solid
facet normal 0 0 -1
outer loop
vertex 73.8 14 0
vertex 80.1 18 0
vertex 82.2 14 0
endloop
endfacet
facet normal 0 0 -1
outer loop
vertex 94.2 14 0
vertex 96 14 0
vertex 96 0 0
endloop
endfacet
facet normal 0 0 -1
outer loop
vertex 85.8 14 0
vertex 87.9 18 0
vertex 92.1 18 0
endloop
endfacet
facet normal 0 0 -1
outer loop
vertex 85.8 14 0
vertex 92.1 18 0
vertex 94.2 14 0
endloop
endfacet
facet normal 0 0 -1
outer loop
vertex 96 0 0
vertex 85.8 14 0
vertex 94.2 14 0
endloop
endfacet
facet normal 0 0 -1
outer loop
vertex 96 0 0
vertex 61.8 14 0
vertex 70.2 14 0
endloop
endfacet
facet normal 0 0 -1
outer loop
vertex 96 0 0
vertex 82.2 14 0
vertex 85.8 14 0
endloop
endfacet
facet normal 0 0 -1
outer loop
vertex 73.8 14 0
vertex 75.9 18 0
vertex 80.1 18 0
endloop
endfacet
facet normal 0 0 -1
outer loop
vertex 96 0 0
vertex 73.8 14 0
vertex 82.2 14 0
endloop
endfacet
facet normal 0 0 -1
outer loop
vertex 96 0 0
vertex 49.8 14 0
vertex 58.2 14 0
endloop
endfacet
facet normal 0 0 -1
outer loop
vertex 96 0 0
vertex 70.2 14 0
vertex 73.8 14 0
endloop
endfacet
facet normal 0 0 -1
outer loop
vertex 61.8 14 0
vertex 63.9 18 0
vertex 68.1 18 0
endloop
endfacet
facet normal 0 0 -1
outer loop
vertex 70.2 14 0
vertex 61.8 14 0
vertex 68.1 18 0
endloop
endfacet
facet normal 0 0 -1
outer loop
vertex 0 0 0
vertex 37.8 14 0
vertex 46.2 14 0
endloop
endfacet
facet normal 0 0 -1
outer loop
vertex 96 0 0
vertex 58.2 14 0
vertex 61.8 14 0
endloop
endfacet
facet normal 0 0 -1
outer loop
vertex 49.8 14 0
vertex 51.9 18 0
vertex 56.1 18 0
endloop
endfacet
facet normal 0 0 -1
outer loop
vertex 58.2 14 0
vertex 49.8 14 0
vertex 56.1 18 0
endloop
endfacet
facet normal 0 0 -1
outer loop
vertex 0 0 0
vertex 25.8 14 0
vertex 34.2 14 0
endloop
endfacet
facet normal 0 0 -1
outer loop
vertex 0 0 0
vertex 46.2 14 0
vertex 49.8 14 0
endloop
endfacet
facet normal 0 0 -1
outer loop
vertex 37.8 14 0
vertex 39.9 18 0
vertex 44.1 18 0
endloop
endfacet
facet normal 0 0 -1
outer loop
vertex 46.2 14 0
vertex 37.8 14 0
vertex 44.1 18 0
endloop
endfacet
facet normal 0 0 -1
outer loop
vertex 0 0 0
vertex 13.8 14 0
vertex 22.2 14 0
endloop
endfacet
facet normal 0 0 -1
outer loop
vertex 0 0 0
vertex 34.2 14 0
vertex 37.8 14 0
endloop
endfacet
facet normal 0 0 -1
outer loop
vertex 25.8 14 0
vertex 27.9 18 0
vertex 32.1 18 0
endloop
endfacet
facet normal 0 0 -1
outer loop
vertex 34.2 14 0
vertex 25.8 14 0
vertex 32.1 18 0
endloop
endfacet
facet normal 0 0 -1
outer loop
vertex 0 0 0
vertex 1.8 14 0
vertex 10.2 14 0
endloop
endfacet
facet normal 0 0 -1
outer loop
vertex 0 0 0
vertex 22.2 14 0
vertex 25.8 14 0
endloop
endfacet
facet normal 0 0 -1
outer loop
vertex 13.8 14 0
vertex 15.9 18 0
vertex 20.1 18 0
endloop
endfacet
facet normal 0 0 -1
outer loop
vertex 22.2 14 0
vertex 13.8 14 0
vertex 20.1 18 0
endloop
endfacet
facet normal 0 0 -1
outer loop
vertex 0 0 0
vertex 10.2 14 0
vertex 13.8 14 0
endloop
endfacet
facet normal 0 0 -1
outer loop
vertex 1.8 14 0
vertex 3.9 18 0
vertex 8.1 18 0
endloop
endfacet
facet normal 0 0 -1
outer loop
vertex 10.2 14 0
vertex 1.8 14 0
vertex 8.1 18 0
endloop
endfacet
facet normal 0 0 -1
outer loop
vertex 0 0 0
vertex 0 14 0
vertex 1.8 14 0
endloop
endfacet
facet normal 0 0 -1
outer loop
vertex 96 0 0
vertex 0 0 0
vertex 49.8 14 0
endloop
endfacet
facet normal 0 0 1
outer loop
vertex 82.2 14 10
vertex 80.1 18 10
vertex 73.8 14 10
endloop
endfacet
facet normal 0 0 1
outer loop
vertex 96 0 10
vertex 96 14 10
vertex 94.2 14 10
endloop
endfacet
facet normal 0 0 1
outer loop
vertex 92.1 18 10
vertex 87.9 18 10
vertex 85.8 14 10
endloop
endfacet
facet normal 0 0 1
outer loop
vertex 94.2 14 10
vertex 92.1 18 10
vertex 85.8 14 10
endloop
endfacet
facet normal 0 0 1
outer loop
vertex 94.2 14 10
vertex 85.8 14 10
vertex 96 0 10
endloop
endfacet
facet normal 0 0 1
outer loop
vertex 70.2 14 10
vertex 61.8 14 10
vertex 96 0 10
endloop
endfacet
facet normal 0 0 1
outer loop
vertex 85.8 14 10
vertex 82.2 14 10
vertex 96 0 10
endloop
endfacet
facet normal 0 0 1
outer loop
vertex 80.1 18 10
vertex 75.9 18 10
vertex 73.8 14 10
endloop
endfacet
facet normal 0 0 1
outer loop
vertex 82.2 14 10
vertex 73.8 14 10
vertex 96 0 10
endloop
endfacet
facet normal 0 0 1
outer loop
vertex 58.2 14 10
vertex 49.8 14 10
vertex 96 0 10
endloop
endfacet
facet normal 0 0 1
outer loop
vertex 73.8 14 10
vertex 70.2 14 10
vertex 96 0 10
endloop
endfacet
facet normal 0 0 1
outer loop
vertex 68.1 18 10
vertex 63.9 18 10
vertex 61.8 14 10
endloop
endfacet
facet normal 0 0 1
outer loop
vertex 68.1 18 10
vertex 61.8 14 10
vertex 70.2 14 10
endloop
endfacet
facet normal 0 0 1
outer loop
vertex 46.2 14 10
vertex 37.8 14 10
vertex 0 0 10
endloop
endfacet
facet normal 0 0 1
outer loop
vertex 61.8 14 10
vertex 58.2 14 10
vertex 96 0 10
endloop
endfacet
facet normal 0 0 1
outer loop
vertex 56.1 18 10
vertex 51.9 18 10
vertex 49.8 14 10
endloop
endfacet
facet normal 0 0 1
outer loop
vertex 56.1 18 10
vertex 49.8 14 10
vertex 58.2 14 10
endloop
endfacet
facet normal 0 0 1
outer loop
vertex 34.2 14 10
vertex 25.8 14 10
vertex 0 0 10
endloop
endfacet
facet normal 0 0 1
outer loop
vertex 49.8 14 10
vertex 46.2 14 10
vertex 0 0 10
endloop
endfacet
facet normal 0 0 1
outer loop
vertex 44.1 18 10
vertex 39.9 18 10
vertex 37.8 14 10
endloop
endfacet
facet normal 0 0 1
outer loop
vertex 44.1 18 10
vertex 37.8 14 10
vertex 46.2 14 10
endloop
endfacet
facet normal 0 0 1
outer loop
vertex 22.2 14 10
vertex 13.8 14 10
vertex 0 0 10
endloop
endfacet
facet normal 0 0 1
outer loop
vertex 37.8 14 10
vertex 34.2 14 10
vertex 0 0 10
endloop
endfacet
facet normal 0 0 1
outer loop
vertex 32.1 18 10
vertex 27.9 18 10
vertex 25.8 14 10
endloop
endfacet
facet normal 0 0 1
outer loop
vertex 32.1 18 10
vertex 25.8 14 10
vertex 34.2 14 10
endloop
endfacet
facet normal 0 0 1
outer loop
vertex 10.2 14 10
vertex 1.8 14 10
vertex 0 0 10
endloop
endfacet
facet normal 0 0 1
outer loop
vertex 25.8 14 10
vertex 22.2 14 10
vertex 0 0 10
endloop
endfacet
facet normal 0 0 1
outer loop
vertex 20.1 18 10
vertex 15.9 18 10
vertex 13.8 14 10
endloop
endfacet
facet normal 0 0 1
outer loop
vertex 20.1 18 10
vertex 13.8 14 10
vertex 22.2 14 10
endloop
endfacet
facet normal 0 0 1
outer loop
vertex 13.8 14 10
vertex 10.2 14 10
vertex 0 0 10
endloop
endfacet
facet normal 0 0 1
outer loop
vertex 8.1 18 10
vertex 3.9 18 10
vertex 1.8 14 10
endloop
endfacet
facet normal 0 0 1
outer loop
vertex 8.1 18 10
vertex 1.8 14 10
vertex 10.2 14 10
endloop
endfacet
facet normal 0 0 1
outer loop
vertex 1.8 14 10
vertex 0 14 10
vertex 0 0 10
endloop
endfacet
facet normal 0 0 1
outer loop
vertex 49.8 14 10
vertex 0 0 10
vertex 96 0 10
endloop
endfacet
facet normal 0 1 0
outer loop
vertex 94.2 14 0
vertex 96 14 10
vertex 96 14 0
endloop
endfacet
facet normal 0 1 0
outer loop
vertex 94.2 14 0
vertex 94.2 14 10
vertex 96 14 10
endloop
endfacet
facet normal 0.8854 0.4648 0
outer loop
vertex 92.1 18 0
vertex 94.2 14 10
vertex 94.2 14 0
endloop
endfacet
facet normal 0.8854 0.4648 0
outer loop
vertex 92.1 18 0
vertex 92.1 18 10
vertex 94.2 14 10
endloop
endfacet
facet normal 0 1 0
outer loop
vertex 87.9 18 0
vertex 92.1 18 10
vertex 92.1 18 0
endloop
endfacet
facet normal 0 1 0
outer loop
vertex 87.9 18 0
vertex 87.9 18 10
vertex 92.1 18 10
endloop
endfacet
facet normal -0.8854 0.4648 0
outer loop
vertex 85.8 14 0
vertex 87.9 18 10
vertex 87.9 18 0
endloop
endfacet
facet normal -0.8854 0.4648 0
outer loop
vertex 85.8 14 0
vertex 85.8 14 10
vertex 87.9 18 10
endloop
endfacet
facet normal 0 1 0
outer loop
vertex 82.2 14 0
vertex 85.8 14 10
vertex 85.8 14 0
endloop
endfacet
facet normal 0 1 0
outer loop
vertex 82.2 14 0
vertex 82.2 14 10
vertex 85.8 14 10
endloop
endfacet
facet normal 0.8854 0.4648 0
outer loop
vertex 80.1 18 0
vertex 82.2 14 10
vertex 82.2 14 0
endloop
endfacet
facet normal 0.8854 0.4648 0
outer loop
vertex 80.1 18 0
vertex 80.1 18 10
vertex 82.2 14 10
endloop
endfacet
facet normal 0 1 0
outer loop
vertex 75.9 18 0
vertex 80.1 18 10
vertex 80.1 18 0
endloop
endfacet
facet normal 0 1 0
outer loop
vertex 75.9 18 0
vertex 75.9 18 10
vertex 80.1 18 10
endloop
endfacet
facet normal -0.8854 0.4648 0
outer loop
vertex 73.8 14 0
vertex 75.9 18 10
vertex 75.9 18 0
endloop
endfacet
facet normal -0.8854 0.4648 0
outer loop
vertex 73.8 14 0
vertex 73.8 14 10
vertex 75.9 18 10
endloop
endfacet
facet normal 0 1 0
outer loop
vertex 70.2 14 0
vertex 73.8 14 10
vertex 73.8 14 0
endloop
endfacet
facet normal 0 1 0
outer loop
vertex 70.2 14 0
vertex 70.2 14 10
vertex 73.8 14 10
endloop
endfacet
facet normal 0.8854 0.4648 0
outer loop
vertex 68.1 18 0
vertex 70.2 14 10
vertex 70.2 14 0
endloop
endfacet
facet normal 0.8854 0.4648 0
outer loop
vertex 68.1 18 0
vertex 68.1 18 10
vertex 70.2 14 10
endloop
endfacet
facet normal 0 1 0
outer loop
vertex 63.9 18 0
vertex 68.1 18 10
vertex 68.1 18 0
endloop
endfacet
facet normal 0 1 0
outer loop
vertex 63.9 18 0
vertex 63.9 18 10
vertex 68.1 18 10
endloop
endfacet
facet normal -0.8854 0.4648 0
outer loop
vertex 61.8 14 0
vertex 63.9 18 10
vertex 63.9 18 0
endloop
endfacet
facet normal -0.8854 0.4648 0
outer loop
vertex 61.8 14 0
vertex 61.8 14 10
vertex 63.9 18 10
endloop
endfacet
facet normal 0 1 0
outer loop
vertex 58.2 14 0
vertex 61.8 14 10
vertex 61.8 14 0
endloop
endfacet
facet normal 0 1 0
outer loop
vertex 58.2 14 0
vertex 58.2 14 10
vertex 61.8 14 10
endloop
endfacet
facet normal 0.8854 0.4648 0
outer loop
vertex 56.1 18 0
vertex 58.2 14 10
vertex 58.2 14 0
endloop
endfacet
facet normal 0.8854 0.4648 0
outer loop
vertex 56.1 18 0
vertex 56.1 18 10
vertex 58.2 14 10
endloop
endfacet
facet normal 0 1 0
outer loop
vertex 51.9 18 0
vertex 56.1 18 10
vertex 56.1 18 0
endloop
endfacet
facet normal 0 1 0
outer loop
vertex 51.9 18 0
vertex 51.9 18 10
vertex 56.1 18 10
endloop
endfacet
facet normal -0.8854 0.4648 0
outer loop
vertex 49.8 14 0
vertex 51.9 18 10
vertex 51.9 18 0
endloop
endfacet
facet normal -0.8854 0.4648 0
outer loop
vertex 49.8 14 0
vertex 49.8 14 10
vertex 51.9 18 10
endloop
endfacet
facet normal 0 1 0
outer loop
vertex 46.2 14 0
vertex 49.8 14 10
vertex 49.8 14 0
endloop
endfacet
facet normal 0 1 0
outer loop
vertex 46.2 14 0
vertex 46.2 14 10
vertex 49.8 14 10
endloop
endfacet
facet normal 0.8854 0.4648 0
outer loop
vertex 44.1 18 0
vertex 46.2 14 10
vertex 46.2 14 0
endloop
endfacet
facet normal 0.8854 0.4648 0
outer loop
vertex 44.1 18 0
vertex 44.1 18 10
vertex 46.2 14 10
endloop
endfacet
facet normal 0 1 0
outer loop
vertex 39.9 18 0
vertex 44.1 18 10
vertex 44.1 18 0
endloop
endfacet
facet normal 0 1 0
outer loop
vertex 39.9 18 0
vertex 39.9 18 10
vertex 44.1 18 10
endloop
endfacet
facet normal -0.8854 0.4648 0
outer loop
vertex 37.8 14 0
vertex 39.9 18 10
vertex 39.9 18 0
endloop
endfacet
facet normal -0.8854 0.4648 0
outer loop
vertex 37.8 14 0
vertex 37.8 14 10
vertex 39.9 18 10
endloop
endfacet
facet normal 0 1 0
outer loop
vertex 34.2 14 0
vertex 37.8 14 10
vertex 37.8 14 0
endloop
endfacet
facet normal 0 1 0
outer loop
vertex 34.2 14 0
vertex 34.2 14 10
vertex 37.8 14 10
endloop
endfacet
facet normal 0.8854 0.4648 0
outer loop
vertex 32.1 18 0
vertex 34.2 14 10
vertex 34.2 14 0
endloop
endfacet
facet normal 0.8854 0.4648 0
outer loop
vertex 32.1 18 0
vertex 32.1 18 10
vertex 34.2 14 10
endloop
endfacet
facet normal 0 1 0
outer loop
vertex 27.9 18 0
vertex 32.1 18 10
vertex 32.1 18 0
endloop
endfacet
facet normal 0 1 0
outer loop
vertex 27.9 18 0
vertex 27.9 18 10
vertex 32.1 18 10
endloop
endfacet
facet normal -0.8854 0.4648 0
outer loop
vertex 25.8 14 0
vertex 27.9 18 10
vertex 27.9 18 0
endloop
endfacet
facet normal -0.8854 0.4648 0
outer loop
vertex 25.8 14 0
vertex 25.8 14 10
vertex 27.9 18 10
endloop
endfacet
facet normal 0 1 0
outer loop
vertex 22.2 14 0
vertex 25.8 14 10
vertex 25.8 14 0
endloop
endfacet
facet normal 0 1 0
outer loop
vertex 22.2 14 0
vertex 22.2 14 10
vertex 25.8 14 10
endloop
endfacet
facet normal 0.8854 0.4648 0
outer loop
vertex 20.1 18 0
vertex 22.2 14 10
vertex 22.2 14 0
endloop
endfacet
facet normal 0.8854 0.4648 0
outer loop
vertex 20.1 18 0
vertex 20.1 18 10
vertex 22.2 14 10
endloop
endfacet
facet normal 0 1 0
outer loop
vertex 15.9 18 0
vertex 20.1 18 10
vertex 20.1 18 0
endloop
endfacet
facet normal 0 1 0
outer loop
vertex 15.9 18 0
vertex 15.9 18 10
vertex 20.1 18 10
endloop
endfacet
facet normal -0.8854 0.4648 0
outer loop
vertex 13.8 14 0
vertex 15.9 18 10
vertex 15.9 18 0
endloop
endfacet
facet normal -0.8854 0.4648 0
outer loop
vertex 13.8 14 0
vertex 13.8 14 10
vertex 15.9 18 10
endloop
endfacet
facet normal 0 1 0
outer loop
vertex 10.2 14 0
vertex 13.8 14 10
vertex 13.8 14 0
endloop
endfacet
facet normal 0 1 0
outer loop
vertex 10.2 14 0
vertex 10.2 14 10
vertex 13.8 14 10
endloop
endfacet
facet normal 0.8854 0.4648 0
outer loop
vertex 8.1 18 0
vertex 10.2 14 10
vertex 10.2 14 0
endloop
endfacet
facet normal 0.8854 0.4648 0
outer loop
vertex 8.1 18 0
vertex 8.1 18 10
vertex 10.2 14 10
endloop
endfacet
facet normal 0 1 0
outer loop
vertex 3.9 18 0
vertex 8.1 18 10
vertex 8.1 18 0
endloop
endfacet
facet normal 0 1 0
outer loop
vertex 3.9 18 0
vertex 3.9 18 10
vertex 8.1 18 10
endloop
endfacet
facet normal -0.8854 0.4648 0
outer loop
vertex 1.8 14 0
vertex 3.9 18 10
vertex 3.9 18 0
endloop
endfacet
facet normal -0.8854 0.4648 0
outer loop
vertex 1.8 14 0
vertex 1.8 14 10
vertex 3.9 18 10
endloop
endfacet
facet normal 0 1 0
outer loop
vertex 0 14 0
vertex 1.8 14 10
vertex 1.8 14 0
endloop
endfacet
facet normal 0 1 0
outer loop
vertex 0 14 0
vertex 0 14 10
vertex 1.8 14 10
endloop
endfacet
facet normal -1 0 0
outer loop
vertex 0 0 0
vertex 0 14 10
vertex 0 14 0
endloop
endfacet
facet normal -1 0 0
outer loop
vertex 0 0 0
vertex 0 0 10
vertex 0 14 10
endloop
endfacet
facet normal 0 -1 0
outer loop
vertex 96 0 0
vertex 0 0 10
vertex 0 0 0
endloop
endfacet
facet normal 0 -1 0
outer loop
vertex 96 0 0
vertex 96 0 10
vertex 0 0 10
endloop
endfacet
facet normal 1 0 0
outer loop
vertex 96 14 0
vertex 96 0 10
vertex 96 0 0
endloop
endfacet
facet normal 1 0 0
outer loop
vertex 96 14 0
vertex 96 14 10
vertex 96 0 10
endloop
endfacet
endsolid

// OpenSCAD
$fn = 32;

// ----------------------------------------------------------------------
// Gear rack: 8 teeth, pitch 12 mm
// ----------------------------------------------------------------------

// --- parameters (mm) ---
teeth = 8;                // number of teeth
pitch = 12;               // tooth pitch, X
root_w = 8.4;             // tooth width at the root
tip_w = 4.2;              // tooth width at the tip
base_h = 14;              // rack body height, Y
tooth_h = 4;              // tooth height above the body
plate_t = 10;             // rack width, Z (extrusion height)

rack_l = teeth * pitch;  // overall length
total_h = base_h + tooth_h;  // overall height

profile = [[0, 0], [96, 0], [96, 14], [94.2, 14], [92.1, 18], [87.9, 18], [85.8, 14], [82.2, 14], [80.1, 18], [75.9, 18], [73.8, 14], [70.2, 14], [68.1, 18], [63.9, 18], [61.8, 14], [58.2, 14], [56.1, 18], [51.9, 18], [49.8, 14], [46.2, 14], [44.1, 18], [39.9, 18], [37.8, 14], [34.2, 14], [32.1, 18], [27.9, 18], [25.8, 14], [22.2, 14], [20.1, 18], [15.9, 18], [13.8, 14], [10.2, 14], [8.1, 18], [3.9, 18], [1.8, 14], [0, 14]];  // primary outline, 36 points, counter clockwise

// --- the one profile operation ---
linear_extrude(height = plate_t) polygon(points = profile);
